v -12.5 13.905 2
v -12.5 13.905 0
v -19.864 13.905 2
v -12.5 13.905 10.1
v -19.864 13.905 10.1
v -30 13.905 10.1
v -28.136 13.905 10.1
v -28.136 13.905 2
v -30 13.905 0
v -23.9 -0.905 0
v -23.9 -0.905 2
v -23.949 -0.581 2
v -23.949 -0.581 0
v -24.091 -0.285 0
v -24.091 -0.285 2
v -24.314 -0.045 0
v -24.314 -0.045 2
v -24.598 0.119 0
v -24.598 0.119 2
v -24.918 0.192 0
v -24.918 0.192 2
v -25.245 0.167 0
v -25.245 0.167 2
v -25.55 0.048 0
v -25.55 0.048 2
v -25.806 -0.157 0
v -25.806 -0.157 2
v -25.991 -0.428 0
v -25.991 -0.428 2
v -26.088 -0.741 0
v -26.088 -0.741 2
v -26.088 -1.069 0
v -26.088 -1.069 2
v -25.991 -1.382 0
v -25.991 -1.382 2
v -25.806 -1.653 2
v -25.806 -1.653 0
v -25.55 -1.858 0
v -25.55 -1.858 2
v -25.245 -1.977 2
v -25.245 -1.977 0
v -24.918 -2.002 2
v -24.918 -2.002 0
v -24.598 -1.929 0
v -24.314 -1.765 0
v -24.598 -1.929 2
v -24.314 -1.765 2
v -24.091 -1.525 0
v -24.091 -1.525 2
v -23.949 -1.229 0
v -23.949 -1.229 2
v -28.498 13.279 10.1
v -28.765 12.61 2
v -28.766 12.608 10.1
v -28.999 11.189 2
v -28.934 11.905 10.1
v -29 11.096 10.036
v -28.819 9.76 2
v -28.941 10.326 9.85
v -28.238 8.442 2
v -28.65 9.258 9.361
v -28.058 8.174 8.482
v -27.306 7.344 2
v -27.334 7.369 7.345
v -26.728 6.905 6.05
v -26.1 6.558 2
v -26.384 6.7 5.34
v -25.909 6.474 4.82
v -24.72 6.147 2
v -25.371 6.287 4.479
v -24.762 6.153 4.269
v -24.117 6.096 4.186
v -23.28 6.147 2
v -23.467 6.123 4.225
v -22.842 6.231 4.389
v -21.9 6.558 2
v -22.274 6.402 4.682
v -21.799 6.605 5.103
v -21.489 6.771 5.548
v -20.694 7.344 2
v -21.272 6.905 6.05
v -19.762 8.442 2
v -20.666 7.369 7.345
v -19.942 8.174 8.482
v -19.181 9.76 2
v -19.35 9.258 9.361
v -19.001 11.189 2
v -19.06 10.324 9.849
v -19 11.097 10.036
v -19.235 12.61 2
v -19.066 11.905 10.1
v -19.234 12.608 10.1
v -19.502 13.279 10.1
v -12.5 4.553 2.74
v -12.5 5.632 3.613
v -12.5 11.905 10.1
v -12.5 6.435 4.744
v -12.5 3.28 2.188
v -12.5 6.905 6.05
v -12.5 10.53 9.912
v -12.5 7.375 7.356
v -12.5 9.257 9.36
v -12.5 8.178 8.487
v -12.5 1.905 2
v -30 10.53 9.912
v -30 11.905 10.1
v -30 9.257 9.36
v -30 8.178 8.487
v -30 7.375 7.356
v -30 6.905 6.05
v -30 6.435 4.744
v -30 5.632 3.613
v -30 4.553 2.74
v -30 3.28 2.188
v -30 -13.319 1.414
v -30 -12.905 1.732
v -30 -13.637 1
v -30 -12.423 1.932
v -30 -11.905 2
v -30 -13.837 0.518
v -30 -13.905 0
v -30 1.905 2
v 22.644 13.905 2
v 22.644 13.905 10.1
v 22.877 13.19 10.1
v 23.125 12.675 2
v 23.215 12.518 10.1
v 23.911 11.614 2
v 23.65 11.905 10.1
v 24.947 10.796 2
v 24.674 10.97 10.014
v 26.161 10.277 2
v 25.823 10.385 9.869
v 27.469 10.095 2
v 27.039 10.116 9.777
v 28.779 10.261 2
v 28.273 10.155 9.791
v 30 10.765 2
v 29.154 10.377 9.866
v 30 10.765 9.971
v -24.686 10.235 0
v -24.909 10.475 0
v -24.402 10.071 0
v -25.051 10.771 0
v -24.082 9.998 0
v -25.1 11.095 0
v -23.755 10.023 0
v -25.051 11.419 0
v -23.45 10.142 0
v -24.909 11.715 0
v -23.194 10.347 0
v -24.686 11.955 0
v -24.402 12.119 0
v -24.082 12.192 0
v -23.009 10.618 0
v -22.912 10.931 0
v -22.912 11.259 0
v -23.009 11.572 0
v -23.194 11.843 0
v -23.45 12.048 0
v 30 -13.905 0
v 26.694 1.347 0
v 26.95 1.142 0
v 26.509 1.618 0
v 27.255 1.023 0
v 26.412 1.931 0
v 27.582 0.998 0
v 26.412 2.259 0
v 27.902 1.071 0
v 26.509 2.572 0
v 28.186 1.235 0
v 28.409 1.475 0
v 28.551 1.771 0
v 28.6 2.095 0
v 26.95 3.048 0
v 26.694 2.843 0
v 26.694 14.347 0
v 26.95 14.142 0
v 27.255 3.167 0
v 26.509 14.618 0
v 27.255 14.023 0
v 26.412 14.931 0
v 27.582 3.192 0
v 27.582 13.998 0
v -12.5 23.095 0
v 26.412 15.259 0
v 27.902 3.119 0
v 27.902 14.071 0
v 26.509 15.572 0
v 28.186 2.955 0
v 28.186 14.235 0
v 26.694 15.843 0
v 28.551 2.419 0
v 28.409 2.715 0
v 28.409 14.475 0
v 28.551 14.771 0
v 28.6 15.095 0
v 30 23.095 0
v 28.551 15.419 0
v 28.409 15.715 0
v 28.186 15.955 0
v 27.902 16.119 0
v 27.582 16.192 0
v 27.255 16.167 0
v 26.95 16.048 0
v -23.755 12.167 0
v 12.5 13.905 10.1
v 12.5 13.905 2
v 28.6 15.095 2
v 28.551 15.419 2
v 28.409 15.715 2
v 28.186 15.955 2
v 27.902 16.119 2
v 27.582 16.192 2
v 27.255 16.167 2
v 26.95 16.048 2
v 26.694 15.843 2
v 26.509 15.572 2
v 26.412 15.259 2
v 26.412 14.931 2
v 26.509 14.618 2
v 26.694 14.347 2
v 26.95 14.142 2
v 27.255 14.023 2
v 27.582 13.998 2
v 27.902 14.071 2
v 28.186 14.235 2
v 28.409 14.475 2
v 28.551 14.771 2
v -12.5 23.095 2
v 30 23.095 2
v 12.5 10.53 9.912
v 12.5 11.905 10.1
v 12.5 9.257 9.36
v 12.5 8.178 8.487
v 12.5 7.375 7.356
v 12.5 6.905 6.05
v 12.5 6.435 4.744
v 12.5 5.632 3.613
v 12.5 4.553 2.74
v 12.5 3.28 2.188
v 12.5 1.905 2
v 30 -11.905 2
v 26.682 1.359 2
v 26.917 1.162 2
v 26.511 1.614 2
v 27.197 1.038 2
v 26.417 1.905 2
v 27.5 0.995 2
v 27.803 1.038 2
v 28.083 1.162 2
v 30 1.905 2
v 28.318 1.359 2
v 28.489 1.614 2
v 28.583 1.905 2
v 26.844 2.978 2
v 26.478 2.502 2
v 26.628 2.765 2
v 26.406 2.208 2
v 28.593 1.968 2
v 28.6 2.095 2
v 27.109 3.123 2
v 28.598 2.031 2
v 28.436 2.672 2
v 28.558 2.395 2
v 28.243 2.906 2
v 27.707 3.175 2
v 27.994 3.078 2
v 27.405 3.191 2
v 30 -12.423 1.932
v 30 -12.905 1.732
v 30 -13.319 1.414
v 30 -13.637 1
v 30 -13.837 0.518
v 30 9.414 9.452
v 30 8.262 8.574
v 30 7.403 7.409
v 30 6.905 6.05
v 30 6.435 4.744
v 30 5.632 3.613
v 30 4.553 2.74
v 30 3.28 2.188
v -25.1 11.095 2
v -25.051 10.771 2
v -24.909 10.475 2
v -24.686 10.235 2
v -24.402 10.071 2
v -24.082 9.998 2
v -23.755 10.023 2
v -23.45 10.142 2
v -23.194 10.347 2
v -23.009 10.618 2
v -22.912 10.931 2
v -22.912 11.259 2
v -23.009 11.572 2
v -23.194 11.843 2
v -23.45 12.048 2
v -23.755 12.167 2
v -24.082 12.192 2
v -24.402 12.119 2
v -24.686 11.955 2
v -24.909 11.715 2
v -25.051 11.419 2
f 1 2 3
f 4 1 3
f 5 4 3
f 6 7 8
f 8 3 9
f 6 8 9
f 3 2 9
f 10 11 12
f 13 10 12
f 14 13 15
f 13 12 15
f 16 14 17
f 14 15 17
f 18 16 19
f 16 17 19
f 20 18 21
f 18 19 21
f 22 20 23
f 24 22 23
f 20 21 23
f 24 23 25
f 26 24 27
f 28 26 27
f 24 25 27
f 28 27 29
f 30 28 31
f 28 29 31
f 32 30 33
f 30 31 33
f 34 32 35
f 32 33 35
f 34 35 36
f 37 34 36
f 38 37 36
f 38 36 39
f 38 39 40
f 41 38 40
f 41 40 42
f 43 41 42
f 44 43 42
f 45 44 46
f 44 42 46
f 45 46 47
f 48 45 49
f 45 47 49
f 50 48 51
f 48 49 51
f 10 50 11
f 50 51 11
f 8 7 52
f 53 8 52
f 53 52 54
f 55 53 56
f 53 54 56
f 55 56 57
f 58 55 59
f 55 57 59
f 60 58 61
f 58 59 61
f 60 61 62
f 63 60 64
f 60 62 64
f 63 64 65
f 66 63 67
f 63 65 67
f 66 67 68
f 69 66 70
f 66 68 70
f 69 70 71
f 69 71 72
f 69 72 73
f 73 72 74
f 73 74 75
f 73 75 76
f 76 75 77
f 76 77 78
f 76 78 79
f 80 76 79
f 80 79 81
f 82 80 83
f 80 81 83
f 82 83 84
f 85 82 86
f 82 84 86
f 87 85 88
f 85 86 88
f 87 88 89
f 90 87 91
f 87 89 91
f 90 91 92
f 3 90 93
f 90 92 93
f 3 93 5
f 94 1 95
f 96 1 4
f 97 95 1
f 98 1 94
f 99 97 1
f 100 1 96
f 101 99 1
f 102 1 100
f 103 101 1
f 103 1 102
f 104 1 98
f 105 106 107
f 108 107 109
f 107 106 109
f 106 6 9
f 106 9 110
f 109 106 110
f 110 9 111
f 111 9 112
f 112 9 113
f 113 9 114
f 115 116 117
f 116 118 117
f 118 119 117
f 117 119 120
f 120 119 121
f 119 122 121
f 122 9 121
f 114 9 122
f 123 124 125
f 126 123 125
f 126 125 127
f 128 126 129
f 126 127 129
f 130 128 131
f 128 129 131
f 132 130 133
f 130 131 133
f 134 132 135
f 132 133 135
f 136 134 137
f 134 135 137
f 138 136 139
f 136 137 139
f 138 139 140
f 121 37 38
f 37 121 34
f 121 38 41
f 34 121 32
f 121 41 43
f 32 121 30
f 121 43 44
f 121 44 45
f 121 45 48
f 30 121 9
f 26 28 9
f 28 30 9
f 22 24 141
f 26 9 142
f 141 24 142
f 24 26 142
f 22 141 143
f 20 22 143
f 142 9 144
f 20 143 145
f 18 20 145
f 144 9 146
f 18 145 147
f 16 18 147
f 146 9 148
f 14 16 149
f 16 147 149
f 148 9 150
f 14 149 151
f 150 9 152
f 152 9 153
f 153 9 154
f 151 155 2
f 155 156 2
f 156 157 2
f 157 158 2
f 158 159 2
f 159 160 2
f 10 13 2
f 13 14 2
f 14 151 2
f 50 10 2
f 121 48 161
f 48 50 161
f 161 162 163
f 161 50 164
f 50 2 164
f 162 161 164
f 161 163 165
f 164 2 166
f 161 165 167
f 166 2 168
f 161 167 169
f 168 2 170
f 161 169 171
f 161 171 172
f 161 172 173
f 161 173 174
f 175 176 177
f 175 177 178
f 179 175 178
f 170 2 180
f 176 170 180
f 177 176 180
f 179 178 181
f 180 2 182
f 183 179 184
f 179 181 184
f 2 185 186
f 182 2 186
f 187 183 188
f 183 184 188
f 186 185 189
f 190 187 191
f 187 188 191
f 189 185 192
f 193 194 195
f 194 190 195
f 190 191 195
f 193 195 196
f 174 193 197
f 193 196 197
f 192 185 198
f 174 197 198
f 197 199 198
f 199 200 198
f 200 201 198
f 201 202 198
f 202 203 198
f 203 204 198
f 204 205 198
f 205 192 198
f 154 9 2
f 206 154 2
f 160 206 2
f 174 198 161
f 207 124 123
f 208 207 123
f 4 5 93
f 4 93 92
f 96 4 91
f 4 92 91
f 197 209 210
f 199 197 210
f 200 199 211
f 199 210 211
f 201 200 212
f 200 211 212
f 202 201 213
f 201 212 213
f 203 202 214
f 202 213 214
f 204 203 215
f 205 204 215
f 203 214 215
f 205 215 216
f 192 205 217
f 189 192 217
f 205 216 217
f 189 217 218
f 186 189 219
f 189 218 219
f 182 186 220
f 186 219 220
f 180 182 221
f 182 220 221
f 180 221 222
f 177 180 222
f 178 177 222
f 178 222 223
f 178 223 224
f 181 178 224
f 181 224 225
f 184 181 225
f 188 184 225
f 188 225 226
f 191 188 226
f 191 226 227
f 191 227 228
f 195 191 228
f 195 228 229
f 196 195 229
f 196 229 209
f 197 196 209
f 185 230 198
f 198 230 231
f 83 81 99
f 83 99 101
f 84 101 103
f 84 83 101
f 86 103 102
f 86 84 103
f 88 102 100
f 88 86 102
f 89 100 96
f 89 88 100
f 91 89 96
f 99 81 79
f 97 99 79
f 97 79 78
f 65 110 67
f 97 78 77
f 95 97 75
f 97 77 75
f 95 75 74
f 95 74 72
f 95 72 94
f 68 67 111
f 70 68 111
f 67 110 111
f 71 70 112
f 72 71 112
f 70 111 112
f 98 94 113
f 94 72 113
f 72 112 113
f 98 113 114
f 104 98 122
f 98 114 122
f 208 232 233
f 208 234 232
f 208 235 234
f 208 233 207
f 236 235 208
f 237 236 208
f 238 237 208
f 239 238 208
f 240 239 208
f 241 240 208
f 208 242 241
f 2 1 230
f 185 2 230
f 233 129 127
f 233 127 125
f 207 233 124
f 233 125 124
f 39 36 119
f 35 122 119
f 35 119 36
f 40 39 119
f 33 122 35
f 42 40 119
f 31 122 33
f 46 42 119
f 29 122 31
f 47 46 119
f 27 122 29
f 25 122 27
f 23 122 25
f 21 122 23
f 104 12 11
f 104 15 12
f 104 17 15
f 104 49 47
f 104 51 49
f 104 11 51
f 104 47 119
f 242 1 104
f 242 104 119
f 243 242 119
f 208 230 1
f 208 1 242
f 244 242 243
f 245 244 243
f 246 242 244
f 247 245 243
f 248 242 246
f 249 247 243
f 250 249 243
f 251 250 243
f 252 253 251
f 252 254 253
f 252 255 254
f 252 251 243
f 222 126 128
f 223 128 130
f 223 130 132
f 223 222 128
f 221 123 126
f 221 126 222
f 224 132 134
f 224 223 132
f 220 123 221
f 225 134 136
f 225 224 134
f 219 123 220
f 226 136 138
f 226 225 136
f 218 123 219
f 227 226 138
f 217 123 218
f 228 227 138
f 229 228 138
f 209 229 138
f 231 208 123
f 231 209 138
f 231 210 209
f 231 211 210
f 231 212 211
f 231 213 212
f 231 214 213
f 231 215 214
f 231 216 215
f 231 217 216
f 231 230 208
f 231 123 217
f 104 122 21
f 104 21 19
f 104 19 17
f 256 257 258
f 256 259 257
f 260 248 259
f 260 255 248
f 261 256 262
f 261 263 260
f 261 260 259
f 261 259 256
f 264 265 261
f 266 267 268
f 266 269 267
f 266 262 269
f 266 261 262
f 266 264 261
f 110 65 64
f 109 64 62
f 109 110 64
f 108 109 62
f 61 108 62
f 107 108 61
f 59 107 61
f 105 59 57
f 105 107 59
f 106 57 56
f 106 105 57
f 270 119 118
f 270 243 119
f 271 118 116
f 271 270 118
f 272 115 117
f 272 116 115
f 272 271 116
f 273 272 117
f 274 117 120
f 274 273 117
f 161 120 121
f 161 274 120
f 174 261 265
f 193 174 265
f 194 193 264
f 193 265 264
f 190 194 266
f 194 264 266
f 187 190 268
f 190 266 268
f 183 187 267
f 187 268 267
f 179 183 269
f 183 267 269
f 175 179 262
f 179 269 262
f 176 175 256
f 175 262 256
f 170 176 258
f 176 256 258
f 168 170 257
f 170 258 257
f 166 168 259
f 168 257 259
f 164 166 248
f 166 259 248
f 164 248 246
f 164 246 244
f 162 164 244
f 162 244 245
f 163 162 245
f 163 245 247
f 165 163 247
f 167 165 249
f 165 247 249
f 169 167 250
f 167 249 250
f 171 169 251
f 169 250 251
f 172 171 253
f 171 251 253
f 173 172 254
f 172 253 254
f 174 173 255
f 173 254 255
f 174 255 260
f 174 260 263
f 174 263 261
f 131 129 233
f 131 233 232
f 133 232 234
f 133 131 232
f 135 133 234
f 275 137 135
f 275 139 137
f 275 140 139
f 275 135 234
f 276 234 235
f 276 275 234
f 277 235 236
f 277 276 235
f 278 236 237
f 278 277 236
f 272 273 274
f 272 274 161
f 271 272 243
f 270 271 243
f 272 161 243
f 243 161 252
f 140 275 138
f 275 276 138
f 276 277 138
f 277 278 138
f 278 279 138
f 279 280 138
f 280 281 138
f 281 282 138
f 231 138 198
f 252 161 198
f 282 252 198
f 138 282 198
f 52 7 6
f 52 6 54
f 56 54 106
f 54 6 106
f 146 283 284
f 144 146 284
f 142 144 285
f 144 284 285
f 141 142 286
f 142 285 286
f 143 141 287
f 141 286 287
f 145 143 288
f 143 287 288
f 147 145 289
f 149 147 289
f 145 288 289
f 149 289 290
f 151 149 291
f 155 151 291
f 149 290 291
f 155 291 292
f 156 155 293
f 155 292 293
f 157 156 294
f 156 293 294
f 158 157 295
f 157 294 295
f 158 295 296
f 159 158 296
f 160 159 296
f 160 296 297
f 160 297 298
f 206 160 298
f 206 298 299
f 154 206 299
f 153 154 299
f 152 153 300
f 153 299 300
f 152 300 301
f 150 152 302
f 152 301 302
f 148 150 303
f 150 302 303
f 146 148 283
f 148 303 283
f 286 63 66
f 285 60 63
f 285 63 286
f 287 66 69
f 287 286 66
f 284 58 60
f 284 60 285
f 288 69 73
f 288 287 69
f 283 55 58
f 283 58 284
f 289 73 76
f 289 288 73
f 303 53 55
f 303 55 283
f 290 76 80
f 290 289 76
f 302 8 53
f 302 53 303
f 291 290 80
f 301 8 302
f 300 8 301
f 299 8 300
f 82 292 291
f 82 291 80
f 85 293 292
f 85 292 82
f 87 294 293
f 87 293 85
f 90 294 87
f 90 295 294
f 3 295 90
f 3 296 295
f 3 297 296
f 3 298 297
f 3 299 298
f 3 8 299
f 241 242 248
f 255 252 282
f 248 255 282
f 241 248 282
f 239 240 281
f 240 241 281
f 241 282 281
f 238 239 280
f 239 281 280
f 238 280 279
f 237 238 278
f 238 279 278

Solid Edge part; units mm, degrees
sketch "Sketch1" plane through (0, 0, 0) normal (0, 0, 1) x (1, 0, 0)
  line L0 (-30, -13.905) -> (30, -13.905)
  line L1 (30, -13.905) -> (30, 13.905)
  line L2 (30, 13.905) -> (-30, 13.905)
  line L3 (-30, 13.905) -> (-30, -13.905)
  dimension "D1" = 60
  dimension "D2" = 27.81
extrude "Protrusion1" add sketch "Sketch1" along normal blind 2
sketch "Sketch2" plane through (0, 0, 2) normal (0, 0, 1) x (1, 0, 0)
  line L0 (30, 13.905) -> (-12.5, 13.905)
  line L1 (-12.5, 13.905) -> (-12.5, 23.095)
  line L2 (-12.5, 23.095) -> (30, 23.095)
  line L3 (30, 23.095) -> (30, 13.905)
  dimension "D1" = 9.19
  dimension "D2" = 42.5
extrude "Extrusionsausprägung_2" add sketch "Sketch2" against normal blind 2
sketch "Sketch3" plane through (0, 4.595, 2) normal (0, 0, 1) x (1, 0, 0)
  circle A0 centre (-25, -5.5) radius 1.1
  circle A1 centre (27.5, 10.5) radius 1.1
  circle A2 centre (27.5, -2.5) radius 1.1
  dimension "D1" = 13
  dimension "D2" = 5
  dimension "D3" = 13
  dimension "D4" = 16
  dimension "D5" = 2.5
  dimension "D6" = 2.2
extrude "Cutout1" cut sketch "Sketch3" against normal up to next
sketch "Sketch4" plane through (-30, 0, 1) normal (-1, 0, 0) x (0, -1, 0)
  line L0 (-13.905, 1) -> (-13.905, 9.1)
  line L1 (-13.905, 9.1) -> (-11.905, 9.1)
  arc A0 (-11.905, 9.1) -> (-6.905, 5.05) centre (-11.905, 3.98858) cw
  arc A1 (-6.905, 5.05) -> (-1.905, 1) centre (-1.905, 6.11142) ccw
  line L2 (-13.905, 1) -> (-1.905, 1)
  dimension "D1" = 8.1
  dimension "D2" = 12
  dimension "D3" = 2
extrude "Extrusionsausprägung_3" add sketch "Sketch4" against normal blind 17.5
fillet "Verrundung_1" radius 2 1 edges at (0, -13.905, 2)
mirror "Mirror1" about plane through (0, 0, 0) normal (1, 0, 0) of "Extrusionsausprägung_3"
sketch "Sketch5" plane through (21.25, 12.905, 10.1) normal (0, 0, 1) x (-1, 0, 0)
  circle A0 centre (-6.25, -2.19) radius 5
  dimension "D1" = 10
extrude "Cutout2" cut sketch "Sketch5" against normal up to vertex (8.1 mm away)
sketch "Sketch6" plane through (-24, 10.405, 2) normal (0, 0, 1) x (-1, 0, 0)
  circle A0 centre (0, -0.69) radius 1.1
  dimension "D1" = 2.2
extrude "Cutout3" cut sketch "Sketch6" against normal through all
sketch "Sketch7" plane through (-21.25, 12.905, 10.1) normal (0, 0, 1) x (-1, 0, 0)
  circle A0 centre (2.75, 1.81) radius 5
  dimension "D1" = 10
extrude "Cutout4" cut sketch "Sketch7" against normal up to vertex (8.1 mm away)
